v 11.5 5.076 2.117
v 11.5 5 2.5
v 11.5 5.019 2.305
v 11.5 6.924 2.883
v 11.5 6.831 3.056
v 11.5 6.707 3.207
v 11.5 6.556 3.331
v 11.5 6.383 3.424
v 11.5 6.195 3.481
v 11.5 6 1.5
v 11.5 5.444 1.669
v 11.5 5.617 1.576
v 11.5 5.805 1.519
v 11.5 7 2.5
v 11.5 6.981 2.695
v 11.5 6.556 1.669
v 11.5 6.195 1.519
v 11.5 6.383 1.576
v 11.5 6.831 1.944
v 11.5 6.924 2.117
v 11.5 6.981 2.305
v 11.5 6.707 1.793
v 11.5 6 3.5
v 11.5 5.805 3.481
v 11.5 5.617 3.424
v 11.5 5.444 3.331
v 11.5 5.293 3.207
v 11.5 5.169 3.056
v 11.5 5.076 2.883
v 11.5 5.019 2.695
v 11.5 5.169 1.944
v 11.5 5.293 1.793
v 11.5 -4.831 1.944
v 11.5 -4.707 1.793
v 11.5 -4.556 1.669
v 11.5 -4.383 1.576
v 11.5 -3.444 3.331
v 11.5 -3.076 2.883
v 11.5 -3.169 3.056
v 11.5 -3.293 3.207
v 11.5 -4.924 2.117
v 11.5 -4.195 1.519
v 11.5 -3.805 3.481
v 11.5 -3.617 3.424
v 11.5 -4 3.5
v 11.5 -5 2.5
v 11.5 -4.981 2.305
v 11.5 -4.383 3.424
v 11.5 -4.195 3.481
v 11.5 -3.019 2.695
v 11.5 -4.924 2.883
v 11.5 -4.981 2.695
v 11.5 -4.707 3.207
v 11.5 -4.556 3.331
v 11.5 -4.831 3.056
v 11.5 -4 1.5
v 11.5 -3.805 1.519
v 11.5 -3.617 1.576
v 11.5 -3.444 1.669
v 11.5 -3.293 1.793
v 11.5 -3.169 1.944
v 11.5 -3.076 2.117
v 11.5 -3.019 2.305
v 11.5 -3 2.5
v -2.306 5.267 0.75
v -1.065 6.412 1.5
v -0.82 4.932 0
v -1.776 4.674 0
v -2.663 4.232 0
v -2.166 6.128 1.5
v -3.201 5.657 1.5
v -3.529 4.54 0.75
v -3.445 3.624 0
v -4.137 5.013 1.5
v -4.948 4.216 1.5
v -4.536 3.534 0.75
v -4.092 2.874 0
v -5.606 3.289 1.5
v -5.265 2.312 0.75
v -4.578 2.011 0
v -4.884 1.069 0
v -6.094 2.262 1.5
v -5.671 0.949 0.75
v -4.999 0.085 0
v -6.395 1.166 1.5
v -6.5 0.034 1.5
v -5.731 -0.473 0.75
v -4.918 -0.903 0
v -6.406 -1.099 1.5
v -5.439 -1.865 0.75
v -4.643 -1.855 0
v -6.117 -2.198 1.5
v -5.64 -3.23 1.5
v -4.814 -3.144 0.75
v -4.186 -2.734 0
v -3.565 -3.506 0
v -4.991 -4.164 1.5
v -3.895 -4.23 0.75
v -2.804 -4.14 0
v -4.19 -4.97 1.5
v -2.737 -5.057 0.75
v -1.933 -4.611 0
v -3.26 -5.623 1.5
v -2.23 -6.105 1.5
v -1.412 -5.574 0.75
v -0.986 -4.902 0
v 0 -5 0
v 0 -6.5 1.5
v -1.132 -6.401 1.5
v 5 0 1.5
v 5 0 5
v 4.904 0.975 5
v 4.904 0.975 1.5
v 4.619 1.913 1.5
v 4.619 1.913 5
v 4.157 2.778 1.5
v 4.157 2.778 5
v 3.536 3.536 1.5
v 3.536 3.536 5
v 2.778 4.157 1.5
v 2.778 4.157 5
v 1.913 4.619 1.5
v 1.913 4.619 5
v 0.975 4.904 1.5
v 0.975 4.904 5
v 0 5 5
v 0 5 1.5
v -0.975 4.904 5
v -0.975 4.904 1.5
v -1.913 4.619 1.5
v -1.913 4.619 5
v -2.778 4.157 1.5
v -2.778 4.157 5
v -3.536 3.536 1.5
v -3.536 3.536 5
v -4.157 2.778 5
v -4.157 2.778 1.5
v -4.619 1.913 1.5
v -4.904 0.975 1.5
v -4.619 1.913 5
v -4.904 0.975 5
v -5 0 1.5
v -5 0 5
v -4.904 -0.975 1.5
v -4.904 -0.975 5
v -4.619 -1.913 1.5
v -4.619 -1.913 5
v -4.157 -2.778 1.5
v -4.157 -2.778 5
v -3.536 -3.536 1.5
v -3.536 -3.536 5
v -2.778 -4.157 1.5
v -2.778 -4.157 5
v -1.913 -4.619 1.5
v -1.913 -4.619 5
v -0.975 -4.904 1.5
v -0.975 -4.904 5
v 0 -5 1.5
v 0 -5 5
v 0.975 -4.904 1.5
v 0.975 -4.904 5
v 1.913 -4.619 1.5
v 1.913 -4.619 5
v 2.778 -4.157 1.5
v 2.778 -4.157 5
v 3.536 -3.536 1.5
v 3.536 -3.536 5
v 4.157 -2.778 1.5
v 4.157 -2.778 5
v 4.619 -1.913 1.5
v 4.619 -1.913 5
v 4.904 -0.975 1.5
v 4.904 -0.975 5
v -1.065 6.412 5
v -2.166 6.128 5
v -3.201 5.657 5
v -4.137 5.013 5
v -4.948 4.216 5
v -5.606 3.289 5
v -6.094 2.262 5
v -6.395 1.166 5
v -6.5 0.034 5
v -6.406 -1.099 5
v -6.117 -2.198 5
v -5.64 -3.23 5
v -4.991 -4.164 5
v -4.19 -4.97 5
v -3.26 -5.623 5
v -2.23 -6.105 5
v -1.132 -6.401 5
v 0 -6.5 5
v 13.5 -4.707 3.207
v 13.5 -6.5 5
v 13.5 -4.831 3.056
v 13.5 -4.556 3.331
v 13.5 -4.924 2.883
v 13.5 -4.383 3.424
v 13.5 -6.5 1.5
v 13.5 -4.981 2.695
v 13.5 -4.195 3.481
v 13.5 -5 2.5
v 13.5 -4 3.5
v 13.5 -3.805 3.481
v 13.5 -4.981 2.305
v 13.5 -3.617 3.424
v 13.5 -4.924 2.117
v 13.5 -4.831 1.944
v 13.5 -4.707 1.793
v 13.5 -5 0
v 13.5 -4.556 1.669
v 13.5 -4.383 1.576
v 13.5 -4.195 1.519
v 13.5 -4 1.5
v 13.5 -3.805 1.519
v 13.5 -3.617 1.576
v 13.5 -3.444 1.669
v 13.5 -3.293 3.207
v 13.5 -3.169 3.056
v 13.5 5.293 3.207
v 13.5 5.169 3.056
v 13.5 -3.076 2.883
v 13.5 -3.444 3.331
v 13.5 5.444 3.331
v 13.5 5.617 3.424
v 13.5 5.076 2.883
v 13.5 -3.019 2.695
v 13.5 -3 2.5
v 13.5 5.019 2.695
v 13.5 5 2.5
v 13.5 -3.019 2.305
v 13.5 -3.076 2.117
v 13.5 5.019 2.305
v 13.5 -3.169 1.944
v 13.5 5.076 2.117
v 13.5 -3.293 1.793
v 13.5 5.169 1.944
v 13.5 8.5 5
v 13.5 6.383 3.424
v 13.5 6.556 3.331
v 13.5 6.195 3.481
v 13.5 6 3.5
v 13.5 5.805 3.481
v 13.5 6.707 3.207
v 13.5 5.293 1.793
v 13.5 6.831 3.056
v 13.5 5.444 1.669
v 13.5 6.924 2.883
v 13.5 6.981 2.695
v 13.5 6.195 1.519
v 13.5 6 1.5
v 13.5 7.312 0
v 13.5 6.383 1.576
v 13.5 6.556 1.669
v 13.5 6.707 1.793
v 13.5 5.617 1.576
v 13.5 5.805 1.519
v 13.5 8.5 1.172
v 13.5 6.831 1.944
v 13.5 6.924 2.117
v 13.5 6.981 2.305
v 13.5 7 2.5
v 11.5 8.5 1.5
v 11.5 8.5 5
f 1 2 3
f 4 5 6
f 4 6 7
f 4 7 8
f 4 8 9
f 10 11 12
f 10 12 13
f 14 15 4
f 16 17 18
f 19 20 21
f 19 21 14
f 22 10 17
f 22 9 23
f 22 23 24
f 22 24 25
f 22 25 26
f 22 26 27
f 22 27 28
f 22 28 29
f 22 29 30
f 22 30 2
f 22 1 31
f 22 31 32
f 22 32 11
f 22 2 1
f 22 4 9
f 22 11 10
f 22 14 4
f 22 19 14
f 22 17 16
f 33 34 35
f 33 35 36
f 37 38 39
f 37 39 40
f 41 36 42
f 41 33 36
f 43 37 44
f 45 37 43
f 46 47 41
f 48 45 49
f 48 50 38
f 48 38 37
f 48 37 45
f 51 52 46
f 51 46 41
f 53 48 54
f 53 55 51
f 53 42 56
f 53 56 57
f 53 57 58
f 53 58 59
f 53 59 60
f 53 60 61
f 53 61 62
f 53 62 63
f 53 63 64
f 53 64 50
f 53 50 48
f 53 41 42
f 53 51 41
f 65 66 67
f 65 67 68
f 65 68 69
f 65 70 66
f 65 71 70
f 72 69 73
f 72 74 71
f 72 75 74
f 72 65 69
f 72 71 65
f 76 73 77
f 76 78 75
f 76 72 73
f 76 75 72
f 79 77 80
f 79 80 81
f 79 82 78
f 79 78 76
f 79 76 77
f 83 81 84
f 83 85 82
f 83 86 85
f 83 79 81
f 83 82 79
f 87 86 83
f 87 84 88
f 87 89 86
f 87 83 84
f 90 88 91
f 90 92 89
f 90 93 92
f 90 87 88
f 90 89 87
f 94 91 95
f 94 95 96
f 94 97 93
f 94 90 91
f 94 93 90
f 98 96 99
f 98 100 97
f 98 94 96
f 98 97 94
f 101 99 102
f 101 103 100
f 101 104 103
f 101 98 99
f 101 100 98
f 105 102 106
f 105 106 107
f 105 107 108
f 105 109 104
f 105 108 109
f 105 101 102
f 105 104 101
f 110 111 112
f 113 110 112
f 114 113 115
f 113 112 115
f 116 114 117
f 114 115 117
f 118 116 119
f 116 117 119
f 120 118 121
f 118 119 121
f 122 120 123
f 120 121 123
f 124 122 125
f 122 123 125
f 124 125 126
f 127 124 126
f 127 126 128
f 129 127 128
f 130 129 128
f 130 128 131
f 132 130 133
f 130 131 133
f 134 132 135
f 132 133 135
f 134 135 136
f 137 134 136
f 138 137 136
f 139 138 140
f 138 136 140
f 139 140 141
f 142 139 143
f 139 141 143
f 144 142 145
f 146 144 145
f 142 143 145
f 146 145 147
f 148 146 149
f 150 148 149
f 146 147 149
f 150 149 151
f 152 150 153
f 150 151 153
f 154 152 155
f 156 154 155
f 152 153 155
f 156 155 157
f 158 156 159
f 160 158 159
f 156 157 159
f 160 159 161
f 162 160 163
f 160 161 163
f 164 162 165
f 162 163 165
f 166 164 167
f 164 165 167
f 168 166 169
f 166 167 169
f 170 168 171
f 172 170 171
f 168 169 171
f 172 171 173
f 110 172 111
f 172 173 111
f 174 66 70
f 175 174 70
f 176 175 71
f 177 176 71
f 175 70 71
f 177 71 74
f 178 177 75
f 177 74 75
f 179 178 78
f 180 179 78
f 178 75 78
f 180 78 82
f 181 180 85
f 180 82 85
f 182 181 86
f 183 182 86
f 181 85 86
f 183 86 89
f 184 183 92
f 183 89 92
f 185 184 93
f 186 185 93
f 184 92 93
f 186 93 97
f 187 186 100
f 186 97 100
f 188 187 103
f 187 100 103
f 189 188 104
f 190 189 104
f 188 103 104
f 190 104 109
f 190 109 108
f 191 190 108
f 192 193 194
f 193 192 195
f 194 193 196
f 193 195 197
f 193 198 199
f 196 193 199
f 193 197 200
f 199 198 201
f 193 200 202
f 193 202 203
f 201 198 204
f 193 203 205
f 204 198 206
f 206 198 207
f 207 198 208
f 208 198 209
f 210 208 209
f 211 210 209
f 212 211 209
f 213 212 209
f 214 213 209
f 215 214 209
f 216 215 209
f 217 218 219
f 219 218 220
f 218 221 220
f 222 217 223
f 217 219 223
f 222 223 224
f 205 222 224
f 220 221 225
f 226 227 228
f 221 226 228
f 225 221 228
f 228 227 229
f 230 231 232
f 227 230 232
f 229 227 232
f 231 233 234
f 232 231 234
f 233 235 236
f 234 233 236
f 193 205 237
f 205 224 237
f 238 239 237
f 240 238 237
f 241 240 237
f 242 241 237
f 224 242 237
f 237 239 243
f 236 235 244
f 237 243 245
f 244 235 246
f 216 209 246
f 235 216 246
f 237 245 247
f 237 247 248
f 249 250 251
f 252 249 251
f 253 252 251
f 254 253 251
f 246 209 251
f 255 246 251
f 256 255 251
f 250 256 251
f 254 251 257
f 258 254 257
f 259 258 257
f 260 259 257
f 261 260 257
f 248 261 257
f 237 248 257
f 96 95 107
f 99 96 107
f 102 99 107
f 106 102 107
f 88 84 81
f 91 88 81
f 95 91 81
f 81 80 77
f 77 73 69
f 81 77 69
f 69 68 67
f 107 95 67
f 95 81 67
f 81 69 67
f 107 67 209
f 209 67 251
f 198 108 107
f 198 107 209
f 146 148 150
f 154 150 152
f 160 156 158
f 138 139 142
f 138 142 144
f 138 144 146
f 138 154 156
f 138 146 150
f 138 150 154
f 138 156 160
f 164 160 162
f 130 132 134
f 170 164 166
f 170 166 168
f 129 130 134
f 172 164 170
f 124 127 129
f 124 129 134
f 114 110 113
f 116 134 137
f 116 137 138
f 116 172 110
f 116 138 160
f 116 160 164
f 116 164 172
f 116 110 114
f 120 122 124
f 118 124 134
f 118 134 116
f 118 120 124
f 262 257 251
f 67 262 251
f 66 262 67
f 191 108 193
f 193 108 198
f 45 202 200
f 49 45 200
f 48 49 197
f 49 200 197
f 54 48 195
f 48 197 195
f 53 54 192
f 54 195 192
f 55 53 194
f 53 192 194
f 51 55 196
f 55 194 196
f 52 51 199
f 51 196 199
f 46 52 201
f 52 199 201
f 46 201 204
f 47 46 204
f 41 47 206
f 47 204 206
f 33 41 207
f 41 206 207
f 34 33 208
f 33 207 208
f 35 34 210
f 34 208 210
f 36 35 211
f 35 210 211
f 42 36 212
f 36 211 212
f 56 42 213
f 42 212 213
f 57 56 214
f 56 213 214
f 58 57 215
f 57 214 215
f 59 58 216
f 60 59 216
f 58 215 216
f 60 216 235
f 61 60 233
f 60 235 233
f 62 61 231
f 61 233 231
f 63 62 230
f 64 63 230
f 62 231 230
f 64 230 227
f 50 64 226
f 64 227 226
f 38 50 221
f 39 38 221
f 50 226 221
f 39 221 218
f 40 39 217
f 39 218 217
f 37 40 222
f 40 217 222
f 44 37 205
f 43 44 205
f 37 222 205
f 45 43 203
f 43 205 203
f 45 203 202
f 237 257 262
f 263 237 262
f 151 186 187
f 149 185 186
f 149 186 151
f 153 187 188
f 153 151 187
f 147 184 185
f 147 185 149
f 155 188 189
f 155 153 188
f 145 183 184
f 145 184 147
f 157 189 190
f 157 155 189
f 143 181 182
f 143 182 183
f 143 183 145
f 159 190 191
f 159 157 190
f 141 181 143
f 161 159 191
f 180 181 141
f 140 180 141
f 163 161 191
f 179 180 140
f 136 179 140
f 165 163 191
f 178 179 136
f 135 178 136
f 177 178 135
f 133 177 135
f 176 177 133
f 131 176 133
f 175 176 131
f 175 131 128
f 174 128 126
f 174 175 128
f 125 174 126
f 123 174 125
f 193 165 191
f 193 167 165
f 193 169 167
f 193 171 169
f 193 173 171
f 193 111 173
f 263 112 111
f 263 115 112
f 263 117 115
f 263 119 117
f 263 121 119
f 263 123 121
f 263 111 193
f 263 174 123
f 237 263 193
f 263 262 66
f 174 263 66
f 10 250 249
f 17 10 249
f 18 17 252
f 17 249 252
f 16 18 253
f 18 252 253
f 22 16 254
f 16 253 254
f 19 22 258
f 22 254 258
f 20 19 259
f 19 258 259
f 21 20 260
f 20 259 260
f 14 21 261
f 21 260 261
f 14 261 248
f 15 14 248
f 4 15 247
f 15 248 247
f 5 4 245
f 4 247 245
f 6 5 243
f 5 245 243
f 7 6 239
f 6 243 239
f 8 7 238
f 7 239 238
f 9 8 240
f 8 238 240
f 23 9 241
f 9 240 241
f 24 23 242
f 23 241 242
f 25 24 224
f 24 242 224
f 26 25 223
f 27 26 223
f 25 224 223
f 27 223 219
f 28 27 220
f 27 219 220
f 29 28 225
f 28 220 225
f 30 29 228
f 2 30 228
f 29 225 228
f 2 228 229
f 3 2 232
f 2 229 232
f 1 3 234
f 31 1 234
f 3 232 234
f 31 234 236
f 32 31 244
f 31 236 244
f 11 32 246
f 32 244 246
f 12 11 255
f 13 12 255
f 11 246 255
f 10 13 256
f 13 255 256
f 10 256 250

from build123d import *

# Parameters (mm, degrees)
BOSS_EXTRUDE1_DEPTH = 5
SKETCH2_R           = 5
CUT_EXTRUDE1_DEPTH  = 3.5
SKETCH3_R           = 1
CUT_EXTRUDE2_DEPTH  = 2
CHAMFER3_SIZE       = 1.5


with BuildPart() as part:
    # Sketch1 → Boss-Extrude1 (new body)
    with BuildSketch(Plane.XY):
        with BuildLine():
            Line((0, -6.5), (13.5, -6.5))
            Line((13.5, -6.5), (13.5, 8.5))
            Line((13.5, 8.5), (11.5, 8.5))
            Line((11.5, 8.5), (-1.065452768, 6.412083156))
            ThreePointArc((-1.065452768, 6.412083156), (-6.477983502, -0.534536942), (0, -6.5))
        make_face()
    extrude(amount=BOSS_EXTRUDE1_DEPTH)

    # Sketch2 → Cut-Extrude1 (cut)
    with BuildSketch(Plane.XY.offset(5)):
        Circle(SKETCH2_R)
    extrude(amount=-CUT_EXTRUDE1_DEPTH, mode=Mode.SUBTRACT)

    # Sketch3 → Cut-Extrude2 (cut)
    with BuildSketch(Plane(origin=(13.5, 0, 0), x_dir=(0, 0, -1), z_dir=(1, 0, 0))):
        with Locations((-2.5, 6)):
            Circle(SKETCH3_R)
        with Locations(Location((-2.5, -4, 0), (0, 0, 180))):
            Circle(SKETCH3_R)
    extrude(amount=-CUT_EXTRUDE2_DEPTH, mode=Mode.SUBTRACT)

    # Chamfer3
    chamfer3_edges = [part.edges().sort_by_distance(p)[0] for p in [
        (5.217273616, 7.456041578, 0),
        (-6.477983502, -0.534536942, 0),
        (6.75, -6.5, 0),
    ]]
    chamfer(chamfer3_edges, length=CHAMFER3_SIZE)


solid = part.part
